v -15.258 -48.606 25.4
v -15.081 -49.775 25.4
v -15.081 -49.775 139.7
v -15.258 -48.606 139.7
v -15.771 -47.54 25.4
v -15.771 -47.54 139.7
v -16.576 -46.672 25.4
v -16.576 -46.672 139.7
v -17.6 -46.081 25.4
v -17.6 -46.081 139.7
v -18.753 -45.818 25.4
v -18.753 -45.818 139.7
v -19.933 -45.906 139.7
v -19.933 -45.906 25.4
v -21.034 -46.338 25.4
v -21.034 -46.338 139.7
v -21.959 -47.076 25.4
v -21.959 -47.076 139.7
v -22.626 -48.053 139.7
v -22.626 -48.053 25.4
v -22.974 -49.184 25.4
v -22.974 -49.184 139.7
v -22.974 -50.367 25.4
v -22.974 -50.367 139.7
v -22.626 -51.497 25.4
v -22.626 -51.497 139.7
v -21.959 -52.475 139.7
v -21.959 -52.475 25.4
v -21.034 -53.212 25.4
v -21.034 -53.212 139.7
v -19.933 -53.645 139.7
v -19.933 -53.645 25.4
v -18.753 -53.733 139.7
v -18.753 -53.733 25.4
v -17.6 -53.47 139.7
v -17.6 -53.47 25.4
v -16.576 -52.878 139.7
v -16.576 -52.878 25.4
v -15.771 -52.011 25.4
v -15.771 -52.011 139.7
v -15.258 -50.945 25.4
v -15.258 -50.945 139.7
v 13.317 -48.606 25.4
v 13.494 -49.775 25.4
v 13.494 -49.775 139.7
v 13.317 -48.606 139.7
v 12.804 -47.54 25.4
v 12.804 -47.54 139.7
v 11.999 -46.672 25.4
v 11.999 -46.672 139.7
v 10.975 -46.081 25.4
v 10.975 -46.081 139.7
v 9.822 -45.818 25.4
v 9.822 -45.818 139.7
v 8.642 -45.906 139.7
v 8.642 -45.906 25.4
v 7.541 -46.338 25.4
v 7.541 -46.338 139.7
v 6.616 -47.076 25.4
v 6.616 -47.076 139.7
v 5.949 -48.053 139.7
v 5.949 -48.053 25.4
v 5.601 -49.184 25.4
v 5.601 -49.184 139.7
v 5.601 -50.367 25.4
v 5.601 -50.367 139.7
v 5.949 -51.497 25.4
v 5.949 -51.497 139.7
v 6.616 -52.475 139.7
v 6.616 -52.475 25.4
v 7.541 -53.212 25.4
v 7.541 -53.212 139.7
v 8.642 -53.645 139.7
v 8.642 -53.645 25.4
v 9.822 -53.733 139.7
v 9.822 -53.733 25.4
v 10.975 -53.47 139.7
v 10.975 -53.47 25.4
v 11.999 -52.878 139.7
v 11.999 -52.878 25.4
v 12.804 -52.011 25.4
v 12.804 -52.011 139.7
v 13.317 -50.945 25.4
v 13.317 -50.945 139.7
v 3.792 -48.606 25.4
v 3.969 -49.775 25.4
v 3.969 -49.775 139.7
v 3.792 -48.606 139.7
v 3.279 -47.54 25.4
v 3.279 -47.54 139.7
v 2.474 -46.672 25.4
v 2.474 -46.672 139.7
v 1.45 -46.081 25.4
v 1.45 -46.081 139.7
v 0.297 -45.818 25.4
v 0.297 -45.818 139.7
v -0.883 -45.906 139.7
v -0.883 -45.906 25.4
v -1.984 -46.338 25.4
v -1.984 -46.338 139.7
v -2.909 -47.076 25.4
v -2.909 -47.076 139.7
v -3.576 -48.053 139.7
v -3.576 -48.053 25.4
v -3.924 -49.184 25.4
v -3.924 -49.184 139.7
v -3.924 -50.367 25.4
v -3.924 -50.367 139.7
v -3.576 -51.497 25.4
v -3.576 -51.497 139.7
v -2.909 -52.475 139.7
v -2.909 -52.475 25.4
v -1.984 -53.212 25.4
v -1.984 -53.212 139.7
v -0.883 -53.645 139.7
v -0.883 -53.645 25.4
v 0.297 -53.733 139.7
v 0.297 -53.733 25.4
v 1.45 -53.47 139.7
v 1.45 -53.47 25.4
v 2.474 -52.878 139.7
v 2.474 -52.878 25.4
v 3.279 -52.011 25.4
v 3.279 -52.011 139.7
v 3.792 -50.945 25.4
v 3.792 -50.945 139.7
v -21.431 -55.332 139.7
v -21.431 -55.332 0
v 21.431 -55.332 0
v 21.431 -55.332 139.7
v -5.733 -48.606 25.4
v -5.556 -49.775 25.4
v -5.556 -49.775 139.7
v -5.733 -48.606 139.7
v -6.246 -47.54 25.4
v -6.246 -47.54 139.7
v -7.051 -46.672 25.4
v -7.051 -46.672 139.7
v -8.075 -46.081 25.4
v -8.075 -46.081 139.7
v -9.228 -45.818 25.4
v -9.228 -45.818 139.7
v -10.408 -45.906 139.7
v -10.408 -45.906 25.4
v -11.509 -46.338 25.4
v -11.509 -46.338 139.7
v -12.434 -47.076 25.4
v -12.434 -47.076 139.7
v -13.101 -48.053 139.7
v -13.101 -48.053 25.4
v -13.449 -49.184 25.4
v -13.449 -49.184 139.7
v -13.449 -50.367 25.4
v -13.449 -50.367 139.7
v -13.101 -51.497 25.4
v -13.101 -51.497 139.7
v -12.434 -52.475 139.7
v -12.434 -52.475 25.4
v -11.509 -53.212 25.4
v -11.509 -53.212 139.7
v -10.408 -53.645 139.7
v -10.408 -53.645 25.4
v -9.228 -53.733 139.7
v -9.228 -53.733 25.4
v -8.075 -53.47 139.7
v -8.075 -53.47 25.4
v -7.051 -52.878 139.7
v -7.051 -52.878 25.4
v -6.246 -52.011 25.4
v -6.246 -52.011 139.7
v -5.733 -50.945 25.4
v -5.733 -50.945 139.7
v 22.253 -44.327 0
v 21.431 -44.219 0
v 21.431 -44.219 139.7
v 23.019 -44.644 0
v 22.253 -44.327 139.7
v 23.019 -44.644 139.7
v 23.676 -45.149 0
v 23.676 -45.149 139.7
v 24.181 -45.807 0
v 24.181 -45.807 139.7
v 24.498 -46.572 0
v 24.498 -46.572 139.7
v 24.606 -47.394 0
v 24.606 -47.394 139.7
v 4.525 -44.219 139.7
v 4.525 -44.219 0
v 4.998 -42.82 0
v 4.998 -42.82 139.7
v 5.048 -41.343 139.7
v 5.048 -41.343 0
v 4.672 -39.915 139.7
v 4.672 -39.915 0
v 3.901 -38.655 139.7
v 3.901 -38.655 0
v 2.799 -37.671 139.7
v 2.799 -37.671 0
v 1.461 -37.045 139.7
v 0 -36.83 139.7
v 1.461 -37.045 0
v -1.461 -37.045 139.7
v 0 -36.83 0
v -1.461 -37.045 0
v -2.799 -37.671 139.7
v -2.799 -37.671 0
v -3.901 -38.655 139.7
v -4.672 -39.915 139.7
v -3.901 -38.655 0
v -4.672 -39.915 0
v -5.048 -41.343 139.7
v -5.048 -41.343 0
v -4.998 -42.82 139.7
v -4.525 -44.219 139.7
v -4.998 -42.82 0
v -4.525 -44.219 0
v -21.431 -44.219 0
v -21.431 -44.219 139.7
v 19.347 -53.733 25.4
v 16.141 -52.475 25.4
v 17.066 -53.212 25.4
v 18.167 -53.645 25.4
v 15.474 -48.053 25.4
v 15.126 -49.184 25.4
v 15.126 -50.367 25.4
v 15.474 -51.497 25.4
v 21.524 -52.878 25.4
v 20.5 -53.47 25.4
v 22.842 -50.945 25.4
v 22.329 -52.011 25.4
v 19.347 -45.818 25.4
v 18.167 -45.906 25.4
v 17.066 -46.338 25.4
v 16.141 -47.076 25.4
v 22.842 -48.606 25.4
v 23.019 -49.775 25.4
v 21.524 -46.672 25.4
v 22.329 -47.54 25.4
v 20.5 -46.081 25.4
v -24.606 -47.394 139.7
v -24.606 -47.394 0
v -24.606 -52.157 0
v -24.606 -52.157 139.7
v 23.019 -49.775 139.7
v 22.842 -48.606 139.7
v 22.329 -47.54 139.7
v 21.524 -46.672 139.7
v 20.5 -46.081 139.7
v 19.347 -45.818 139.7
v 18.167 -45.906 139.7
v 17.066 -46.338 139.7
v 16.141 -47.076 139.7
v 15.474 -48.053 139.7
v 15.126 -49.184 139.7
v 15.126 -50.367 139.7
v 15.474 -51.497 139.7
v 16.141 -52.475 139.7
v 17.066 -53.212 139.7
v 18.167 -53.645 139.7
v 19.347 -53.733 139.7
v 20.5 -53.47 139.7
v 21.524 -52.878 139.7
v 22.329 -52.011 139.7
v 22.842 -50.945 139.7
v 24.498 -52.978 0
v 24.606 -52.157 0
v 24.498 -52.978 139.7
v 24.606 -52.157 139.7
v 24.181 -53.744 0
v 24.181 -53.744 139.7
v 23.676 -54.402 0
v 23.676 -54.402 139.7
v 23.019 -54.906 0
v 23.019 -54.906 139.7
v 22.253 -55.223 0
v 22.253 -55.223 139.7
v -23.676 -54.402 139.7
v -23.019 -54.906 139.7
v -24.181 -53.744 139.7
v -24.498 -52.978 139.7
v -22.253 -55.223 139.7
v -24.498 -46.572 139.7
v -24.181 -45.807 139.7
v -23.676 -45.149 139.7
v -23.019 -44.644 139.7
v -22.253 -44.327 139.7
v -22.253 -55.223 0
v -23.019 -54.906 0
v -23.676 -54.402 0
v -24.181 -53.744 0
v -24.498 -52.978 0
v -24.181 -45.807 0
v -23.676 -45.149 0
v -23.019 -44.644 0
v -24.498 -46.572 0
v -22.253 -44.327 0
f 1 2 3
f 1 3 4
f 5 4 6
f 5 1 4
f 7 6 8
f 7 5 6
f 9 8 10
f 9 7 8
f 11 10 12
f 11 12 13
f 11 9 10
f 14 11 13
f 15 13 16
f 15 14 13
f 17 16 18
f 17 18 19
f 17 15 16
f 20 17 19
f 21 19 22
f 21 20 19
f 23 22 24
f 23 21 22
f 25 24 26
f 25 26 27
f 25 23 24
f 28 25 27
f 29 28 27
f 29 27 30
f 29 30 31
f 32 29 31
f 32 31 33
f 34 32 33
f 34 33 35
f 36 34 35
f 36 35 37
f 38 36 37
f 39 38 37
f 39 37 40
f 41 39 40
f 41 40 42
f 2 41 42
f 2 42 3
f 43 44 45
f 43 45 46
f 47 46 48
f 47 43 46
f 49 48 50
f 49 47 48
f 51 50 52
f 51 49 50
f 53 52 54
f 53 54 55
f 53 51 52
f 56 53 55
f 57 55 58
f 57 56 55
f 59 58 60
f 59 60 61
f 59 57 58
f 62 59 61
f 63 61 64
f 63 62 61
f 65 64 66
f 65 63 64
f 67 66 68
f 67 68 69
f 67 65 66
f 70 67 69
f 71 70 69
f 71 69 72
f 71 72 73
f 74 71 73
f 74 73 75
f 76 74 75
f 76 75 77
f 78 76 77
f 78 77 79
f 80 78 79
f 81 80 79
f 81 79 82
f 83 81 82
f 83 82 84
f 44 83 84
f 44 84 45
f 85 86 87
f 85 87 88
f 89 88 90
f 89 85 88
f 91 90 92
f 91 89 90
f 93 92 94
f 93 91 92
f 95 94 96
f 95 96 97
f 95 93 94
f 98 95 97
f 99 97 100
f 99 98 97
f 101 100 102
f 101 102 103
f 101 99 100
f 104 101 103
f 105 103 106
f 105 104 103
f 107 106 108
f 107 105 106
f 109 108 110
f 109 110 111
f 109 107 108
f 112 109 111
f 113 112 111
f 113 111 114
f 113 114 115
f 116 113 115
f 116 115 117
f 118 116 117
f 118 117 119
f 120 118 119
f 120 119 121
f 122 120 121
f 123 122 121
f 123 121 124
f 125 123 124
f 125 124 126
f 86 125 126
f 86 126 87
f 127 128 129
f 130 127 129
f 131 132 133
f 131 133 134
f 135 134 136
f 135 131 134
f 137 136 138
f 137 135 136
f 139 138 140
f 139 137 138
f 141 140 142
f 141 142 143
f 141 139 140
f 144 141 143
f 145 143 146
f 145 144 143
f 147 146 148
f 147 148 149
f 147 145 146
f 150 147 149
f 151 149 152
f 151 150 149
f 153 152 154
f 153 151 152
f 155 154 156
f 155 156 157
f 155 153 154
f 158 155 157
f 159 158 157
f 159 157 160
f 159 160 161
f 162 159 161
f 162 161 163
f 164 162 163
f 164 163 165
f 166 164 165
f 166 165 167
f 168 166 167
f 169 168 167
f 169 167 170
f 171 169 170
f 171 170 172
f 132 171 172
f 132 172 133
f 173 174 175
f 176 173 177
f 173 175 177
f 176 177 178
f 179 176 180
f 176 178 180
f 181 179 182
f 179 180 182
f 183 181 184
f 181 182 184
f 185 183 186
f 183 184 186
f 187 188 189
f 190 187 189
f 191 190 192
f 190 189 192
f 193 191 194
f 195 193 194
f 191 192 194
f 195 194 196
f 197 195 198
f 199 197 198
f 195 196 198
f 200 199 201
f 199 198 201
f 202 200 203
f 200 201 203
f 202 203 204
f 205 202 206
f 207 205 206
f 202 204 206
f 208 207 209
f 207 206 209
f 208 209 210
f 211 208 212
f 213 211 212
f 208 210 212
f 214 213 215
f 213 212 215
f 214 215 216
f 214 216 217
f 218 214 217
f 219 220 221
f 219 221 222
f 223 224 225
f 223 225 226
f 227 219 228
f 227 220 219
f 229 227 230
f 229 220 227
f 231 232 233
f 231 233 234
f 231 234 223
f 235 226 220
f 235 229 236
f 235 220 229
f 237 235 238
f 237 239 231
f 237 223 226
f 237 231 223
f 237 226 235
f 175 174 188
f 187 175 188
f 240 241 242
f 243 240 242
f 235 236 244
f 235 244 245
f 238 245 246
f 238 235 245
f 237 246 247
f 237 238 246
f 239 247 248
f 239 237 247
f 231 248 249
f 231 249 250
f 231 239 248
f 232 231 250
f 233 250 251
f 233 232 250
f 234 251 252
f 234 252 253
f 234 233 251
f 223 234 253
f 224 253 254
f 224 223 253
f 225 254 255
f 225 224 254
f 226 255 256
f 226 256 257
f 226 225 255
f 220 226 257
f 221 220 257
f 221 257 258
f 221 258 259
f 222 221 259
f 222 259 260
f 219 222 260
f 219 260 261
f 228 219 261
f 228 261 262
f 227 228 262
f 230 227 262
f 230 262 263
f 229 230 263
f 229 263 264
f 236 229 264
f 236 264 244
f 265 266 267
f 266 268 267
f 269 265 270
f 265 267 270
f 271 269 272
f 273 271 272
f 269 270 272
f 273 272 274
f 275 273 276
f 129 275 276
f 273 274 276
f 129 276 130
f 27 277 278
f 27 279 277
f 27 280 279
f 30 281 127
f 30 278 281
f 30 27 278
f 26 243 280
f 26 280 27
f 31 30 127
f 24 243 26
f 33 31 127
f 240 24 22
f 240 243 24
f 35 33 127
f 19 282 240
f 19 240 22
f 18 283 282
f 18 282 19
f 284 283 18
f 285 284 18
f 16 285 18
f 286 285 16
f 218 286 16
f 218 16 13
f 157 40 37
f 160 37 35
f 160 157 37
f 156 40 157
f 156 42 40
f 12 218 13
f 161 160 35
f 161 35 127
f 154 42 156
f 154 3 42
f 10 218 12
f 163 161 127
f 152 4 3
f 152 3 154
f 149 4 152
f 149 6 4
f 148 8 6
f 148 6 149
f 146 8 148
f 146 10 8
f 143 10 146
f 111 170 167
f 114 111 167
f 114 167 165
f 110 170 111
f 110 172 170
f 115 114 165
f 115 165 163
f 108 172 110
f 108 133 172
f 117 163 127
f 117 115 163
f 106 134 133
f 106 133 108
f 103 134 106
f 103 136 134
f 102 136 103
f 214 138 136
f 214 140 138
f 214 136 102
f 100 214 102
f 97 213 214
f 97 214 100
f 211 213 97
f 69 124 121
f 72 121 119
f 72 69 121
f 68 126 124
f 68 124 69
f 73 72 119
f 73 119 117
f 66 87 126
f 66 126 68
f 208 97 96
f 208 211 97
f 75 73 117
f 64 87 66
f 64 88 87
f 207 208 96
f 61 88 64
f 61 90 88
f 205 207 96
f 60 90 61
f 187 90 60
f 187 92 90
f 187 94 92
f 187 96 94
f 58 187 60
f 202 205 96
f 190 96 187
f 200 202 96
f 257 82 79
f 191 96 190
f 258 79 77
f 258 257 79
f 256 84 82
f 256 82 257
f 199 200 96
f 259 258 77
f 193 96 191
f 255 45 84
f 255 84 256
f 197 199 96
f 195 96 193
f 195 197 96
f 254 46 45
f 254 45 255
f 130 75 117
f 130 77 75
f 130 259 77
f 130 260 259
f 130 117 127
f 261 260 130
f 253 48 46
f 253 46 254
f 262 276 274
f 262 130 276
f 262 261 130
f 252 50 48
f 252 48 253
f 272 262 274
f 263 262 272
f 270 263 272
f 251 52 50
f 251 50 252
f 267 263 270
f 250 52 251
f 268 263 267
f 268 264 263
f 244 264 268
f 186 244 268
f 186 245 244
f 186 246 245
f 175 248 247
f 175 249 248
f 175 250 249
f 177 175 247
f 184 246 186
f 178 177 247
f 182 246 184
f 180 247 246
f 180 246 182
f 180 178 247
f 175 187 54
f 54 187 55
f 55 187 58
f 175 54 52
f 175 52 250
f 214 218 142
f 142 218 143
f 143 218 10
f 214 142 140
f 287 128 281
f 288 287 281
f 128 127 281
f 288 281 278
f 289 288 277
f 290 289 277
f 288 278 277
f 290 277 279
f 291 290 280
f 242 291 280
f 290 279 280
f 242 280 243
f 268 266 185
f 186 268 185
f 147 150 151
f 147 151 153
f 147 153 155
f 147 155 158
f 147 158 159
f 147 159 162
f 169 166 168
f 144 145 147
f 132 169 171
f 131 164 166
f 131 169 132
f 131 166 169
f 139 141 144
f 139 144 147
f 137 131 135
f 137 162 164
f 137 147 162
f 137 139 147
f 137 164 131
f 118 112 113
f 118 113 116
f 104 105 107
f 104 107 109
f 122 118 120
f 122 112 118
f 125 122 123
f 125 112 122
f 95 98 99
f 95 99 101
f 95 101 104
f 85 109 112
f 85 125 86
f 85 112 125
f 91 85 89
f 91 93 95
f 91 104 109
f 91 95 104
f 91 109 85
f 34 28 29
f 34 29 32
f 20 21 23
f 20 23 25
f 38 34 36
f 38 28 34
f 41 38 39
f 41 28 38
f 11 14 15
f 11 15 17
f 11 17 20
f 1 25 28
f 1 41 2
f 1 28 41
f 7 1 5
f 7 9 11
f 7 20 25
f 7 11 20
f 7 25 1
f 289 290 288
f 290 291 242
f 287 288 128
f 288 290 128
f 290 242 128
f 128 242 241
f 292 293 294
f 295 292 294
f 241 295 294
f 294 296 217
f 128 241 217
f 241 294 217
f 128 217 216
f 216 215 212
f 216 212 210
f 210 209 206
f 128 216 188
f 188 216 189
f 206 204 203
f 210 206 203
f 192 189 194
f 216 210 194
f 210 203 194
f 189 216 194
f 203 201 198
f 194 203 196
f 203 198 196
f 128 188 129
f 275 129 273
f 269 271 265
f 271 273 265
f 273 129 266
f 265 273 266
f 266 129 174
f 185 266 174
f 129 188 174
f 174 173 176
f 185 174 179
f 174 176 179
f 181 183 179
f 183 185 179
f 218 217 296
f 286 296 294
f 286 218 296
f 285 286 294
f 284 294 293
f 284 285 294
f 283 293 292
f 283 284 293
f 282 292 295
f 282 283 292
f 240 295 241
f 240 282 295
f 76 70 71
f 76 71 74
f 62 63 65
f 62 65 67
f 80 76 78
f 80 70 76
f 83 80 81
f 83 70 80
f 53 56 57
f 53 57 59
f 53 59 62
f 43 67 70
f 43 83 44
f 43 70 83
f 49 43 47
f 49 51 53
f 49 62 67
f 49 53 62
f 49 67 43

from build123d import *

# Parameters (mm, degrees)
F0_R     = 3.96875
F1_DEPTH = 139.7
F2_DEPTH = 25.4
F3_R     = 3.175


with BuildPart() as f1:
    # F0 (on Top) → F1 (new body)
    with BuildSketch(Plane.XY):
        with BuildLine():
            Line((24.60625, -44.219091), (4.524876, -44.219091))
            ThreePointArc((4.524876, -44.219091), (0, -36.83), (-4.524876, -44.219091))
            Line((-4.524876, -44.219091), (-24.60625, -44.219091))
            Line((-24.60625, -44.219091), (-24.60625, -55.331591))
            Line((-24.60625, -55.331591), (24.60625, -55.331591))
            Line((24.60625, -55.331591), (24.60625, -44.219091))
        make_face()
        with Locations((-19.05, -49.775341)):
            Circle(F0_R, mode=Mode.SUBTRACT)
        with Locations((-9.525, -49.775341)):
            Circle(F0_R, mode=Mode.SUBTRACT)
        with Locations((0, -49.775341)):
            Circle(F0_R, mode=Mode.SUBTRACT)
        with Locations((9.525, -49.775341)):
            Circle(F0_R, mode=Mode.SUBTRACT)
        with Locations((19.05, -49.775341)):
            Circle(F0_R, mode=Mode.SUBTRACT)
    extrude(amount=F1_DEPTH)

    # F0 (on Top) → F2 (join)
    with BuildSketch(Plane.XY):
        with Locations((-19.05, -49.775341)):
            Circle(F0_R)
        with Locations((-9.525, -49.775341)):
            Circle(F0_R)
        with Locations((0, -49.775341)):
            Circle(F0_R)
        with Locations((9.525, -49.775341)):
            Circle(F0_R)
        with Locations((19.05, -49.775341)):
            Circle(F0_R)
    extrude(amount=F2_DEPTH)

    # F3
    f3_edges = [f1.edges().sort_by_distance(p)[0] for p in [
        (24.60625, -55.331591, 69.85),
        (24.60625, -44.219091, 69.85),
        (-24.60625, -44.219091, 69.85),
        (-24.60625, -55.331591, 69.85),
    ]]
    fillet(f3_edges, radius=F3_R)


solid = f1.part
